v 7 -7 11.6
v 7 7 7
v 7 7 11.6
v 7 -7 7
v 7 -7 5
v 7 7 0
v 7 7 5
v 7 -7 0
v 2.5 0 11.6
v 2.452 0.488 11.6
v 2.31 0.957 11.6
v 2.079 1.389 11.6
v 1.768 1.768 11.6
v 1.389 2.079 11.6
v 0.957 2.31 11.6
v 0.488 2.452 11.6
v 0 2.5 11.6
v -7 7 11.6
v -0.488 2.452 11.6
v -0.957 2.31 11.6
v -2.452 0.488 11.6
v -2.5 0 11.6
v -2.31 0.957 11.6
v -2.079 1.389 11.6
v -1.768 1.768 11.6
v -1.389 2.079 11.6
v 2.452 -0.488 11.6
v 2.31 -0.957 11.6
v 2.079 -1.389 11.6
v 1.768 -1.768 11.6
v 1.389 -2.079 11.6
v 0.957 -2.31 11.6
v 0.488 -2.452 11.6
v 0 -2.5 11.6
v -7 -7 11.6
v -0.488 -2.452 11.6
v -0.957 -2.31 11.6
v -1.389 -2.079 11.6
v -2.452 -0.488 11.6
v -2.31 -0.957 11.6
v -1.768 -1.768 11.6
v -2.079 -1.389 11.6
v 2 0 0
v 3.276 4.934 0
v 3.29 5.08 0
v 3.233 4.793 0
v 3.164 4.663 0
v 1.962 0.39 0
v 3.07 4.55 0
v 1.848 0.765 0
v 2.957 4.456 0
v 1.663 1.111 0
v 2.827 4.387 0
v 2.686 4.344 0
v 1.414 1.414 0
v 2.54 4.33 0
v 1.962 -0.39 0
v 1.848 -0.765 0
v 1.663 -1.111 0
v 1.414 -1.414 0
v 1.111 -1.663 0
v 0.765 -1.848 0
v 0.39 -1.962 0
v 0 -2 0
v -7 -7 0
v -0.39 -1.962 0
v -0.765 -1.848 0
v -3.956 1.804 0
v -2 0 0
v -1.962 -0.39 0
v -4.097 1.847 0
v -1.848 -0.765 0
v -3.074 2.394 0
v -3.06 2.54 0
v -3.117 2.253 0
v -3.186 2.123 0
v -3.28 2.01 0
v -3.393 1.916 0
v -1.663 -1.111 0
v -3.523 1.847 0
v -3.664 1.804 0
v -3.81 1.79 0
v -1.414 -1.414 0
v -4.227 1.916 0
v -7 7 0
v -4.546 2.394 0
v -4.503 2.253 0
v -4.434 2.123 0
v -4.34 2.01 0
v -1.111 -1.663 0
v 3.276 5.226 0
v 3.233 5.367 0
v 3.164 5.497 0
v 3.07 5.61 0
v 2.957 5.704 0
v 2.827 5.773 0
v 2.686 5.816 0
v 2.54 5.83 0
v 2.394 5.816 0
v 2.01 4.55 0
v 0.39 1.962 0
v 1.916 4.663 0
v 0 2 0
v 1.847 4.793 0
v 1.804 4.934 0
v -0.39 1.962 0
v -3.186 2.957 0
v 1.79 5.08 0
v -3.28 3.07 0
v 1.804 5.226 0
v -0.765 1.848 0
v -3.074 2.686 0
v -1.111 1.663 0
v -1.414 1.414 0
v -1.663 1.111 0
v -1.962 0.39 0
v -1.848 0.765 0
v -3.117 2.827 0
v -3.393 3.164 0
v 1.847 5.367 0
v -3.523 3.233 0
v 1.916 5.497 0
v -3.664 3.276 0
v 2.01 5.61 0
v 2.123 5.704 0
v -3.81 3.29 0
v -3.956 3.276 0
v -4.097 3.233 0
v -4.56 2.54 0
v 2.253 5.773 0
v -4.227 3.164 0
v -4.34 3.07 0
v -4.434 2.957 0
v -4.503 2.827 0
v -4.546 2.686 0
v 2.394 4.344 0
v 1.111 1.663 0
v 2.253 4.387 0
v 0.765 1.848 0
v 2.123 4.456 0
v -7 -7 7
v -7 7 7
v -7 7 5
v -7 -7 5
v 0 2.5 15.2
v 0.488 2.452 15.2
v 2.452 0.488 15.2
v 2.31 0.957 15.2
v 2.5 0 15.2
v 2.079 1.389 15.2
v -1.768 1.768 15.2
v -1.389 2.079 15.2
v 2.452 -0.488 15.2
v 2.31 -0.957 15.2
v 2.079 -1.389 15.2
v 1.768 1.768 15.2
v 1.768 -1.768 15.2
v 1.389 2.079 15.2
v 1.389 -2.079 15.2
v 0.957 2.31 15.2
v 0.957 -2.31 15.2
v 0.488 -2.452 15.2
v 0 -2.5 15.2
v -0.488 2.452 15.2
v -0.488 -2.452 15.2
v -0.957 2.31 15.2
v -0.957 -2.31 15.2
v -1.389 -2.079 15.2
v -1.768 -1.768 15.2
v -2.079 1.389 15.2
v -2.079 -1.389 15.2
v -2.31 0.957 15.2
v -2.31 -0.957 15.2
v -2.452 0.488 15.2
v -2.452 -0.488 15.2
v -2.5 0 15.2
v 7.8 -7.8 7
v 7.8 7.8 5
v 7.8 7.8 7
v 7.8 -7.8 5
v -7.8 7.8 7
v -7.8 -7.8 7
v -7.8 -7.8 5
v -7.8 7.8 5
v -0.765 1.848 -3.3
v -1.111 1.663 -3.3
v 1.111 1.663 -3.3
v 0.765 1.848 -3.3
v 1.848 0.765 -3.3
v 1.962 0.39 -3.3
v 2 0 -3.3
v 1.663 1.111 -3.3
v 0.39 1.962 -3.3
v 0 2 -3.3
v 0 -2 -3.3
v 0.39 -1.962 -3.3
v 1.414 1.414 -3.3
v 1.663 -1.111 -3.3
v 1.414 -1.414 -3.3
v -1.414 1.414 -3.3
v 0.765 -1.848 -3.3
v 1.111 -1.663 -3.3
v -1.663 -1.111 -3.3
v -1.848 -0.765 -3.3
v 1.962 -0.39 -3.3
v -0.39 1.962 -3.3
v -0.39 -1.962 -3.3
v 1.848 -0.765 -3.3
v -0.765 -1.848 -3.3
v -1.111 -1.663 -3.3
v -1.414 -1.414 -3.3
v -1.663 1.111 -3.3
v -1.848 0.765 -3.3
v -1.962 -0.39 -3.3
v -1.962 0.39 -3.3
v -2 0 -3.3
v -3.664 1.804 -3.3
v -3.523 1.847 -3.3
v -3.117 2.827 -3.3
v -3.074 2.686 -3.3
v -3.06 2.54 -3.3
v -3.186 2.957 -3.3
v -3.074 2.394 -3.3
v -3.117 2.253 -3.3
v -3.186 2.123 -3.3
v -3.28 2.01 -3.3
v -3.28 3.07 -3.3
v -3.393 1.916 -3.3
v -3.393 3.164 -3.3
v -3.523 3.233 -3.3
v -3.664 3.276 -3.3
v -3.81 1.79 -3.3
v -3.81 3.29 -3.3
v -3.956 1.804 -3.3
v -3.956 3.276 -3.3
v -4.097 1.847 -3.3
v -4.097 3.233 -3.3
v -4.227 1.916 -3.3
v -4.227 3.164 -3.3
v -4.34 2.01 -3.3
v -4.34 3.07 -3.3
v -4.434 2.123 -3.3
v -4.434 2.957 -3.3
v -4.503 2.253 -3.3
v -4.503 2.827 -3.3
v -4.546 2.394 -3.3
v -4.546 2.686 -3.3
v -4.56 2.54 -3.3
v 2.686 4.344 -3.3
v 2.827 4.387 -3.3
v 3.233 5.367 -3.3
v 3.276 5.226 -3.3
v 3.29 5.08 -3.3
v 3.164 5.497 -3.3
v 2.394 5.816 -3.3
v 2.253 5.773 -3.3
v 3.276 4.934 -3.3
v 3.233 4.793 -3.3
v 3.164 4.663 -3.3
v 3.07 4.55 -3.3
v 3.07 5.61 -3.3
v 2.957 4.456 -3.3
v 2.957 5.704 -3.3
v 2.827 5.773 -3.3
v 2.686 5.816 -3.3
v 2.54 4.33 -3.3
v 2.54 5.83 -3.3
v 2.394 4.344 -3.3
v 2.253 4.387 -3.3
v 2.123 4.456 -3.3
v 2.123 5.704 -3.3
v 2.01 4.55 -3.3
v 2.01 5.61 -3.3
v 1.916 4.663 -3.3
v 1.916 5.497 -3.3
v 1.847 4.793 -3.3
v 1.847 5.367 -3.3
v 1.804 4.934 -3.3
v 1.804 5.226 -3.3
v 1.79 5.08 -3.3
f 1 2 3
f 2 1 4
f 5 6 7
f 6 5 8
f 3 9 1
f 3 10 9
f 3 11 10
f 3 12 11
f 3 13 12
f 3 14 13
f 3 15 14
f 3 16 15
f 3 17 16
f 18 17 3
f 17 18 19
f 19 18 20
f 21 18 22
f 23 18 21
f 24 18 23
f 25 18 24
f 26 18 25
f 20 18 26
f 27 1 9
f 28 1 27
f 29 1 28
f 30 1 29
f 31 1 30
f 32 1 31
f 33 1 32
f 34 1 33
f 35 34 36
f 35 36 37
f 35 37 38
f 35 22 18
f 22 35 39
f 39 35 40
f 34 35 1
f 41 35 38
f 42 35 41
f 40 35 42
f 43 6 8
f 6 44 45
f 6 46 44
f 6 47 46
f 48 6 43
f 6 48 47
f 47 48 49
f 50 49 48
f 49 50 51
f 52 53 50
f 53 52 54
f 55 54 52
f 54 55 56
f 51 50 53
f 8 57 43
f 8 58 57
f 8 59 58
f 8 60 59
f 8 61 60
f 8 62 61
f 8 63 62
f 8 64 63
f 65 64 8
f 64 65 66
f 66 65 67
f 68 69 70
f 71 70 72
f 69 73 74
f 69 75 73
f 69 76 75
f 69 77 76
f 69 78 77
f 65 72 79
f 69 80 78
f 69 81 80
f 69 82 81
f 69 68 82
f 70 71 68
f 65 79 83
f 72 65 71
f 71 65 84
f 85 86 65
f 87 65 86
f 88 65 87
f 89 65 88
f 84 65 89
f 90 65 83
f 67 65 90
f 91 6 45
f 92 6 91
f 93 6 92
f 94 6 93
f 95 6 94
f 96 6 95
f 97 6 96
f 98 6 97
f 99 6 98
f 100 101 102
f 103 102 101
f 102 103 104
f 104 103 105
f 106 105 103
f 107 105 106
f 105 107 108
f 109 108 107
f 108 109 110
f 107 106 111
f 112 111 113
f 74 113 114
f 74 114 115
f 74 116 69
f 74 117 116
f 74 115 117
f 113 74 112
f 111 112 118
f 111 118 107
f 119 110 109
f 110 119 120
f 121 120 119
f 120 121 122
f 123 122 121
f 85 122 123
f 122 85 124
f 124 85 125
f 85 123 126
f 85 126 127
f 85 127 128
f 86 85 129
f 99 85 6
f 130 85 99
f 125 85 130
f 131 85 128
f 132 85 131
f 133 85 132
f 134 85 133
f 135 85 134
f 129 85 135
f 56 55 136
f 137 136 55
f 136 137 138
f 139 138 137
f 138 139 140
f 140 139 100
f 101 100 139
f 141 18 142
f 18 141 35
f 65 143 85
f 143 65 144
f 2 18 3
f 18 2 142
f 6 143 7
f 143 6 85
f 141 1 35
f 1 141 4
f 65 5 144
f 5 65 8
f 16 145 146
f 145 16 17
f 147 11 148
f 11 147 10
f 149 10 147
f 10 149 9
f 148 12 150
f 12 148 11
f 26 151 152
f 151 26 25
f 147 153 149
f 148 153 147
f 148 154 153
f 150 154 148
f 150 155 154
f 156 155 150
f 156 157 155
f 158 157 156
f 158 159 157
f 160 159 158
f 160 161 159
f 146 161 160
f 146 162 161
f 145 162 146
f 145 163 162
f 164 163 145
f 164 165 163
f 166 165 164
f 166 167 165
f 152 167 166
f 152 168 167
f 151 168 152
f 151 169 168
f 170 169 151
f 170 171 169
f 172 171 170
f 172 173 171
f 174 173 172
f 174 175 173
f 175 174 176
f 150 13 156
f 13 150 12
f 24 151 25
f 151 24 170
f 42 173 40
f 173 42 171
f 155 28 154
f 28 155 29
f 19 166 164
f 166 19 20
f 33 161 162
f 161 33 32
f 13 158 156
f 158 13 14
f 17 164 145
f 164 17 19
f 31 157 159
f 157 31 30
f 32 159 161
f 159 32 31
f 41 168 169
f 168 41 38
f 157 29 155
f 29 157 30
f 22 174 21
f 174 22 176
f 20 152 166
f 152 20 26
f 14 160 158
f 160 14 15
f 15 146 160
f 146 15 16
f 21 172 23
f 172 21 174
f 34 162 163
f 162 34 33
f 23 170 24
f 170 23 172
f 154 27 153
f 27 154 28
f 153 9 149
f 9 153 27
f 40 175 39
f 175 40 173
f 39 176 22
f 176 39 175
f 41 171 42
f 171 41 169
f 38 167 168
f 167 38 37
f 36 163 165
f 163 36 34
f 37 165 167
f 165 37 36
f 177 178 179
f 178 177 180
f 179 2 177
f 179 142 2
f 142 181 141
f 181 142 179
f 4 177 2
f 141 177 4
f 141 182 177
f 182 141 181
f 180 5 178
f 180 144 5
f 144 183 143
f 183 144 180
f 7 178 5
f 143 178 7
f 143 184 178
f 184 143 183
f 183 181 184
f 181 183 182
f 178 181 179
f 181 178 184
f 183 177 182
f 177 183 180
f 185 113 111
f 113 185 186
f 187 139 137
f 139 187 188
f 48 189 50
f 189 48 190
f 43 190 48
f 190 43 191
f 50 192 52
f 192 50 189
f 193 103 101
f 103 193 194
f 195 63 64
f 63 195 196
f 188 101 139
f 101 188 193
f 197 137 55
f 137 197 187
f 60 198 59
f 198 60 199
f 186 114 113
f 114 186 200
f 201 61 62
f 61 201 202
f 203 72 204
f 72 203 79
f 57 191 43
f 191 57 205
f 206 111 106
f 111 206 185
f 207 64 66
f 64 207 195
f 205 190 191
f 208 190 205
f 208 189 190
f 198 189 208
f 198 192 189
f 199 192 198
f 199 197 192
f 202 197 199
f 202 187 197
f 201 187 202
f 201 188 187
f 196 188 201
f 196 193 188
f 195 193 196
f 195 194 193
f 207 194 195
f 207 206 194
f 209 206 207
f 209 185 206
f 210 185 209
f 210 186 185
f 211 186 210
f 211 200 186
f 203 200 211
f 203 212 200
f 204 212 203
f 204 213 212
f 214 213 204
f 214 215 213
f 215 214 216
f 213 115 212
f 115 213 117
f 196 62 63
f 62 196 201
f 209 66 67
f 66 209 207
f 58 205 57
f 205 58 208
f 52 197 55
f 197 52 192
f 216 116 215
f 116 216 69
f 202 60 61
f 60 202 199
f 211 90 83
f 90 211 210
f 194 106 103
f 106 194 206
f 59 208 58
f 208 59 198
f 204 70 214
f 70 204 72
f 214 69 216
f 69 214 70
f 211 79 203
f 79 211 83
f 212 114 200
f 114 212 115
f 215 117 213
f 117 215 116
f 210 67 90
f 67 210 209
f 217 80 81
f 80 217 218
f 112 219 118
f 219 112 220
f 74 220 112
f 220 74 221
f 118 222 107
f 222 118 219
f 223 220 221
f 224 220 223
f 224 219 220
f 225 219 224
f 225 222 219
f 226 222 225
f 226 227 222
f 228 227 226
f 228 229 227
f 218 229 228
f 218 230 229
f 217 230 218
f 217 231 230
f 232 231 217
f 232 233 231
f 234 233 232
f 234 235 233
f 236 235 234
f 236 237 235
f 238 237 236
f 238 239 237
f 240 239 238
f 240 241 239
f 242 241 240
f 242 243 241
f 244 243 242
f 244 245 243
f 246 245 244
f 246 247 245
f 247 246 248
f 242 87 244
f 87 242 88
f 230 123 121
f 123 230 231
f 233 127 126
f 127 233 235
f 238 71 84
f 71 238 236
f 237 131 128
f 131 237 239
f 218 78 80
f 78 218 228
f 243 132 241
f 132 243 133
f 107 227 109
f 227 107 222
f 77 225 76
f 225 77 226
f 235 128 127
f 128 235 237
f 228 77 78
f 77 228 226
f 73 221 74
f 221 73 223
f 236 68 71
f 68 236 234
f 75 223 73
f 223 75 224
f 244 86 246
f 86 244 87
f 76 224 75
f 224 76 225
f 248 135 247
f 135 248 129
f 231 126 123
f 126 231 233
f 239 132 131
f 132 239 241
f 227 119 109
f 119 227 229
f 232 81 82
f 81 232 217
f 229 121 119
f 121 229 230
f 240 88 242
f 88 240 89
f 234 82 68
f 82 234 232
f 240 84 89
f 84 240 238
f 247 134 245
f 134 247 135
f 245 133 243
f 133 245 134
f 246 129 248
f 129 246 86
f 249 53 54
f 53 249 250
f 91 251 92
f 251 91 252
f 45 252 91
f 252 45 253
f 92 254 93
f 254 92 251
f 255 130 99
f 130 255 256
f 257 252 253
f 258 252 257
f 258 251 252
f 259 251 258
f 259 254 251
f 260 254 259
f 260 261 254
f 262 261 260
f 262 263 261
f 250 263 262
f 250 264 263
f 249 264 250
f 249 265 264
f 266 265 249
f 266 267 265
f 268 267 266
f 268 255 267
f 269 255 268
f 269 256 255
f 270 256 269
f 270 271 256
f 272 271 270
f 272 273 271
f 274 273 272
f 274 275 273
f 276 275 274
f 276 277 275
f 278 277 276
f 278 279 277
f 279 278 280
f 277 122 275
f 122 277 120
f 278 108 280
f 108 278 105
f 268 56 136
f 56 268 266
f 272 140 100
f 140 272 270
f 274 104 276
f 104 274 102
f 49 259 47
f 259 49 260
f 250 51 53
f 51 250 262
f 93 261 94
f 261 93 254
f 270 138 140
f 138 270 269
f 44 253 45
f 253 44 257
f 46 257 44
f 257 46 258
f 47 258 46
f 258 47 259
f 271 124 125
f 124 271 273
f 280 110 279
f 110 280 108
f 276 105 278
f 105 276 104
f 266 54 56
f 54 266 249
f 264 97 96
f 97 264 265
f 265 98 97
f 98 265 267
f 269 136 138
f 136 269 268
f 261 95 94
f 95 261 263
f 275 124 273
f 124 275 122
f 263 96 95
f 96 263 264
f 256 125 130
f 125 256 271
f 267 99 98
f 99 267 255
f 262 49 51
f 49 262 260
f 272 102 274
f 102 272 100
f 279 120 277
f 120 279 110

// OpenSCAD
//
// Cherry MX keyswitch simple model
//
$fn = 32;
mm = 25.4;

mx_wid = 15.6;		/* max width above flange */
mx_hgt = 11.6;
mx_shaft_len = 3.6;
mx_shaft_dia = 5;
mx_cutout = 14;
mx_flange = 5.0;
mx_peg_len = 3.3;
mx_lg_peg = 4.0;		/* large peg */
mx_sm_peg = 1.5;		/* small peg */


module peg_at(x,y,dia) {
     translate( [x, y, -mx_peg_len])
	  cylinder( d=dia, h=mx_peg_len);
}

module mx() {
     /* body at cutout size */
     translate( [-mx_cutout/2, -mx_cutout/2, 0])
	  cube( [mx_cutout, mx_cutout, mx_hgt]);
     translate( [0, 0, mx_hgt])
	  cylinder( d=mx_shaft_dia, h=mx_shaft_len);
     /* flange above cutout */
     translate( [-mx_wid/2, -mx_wid/2, mx_flange])
	  cube( [mx_wid, mx_wid, 2]);
     /* pegs */
     peg_at( 0, 0, mx_lg_peg);
     peg_at( -0.15*mm, 0.1*mm, mx_sm_peg);
     peg_at( 0.1*mm, 0.2*mm, mx_sm_peg);
}

module mx_cap() {
     cap_w1 = 18.1;
     cap_w2 = 12.37;
     
}

mx();
